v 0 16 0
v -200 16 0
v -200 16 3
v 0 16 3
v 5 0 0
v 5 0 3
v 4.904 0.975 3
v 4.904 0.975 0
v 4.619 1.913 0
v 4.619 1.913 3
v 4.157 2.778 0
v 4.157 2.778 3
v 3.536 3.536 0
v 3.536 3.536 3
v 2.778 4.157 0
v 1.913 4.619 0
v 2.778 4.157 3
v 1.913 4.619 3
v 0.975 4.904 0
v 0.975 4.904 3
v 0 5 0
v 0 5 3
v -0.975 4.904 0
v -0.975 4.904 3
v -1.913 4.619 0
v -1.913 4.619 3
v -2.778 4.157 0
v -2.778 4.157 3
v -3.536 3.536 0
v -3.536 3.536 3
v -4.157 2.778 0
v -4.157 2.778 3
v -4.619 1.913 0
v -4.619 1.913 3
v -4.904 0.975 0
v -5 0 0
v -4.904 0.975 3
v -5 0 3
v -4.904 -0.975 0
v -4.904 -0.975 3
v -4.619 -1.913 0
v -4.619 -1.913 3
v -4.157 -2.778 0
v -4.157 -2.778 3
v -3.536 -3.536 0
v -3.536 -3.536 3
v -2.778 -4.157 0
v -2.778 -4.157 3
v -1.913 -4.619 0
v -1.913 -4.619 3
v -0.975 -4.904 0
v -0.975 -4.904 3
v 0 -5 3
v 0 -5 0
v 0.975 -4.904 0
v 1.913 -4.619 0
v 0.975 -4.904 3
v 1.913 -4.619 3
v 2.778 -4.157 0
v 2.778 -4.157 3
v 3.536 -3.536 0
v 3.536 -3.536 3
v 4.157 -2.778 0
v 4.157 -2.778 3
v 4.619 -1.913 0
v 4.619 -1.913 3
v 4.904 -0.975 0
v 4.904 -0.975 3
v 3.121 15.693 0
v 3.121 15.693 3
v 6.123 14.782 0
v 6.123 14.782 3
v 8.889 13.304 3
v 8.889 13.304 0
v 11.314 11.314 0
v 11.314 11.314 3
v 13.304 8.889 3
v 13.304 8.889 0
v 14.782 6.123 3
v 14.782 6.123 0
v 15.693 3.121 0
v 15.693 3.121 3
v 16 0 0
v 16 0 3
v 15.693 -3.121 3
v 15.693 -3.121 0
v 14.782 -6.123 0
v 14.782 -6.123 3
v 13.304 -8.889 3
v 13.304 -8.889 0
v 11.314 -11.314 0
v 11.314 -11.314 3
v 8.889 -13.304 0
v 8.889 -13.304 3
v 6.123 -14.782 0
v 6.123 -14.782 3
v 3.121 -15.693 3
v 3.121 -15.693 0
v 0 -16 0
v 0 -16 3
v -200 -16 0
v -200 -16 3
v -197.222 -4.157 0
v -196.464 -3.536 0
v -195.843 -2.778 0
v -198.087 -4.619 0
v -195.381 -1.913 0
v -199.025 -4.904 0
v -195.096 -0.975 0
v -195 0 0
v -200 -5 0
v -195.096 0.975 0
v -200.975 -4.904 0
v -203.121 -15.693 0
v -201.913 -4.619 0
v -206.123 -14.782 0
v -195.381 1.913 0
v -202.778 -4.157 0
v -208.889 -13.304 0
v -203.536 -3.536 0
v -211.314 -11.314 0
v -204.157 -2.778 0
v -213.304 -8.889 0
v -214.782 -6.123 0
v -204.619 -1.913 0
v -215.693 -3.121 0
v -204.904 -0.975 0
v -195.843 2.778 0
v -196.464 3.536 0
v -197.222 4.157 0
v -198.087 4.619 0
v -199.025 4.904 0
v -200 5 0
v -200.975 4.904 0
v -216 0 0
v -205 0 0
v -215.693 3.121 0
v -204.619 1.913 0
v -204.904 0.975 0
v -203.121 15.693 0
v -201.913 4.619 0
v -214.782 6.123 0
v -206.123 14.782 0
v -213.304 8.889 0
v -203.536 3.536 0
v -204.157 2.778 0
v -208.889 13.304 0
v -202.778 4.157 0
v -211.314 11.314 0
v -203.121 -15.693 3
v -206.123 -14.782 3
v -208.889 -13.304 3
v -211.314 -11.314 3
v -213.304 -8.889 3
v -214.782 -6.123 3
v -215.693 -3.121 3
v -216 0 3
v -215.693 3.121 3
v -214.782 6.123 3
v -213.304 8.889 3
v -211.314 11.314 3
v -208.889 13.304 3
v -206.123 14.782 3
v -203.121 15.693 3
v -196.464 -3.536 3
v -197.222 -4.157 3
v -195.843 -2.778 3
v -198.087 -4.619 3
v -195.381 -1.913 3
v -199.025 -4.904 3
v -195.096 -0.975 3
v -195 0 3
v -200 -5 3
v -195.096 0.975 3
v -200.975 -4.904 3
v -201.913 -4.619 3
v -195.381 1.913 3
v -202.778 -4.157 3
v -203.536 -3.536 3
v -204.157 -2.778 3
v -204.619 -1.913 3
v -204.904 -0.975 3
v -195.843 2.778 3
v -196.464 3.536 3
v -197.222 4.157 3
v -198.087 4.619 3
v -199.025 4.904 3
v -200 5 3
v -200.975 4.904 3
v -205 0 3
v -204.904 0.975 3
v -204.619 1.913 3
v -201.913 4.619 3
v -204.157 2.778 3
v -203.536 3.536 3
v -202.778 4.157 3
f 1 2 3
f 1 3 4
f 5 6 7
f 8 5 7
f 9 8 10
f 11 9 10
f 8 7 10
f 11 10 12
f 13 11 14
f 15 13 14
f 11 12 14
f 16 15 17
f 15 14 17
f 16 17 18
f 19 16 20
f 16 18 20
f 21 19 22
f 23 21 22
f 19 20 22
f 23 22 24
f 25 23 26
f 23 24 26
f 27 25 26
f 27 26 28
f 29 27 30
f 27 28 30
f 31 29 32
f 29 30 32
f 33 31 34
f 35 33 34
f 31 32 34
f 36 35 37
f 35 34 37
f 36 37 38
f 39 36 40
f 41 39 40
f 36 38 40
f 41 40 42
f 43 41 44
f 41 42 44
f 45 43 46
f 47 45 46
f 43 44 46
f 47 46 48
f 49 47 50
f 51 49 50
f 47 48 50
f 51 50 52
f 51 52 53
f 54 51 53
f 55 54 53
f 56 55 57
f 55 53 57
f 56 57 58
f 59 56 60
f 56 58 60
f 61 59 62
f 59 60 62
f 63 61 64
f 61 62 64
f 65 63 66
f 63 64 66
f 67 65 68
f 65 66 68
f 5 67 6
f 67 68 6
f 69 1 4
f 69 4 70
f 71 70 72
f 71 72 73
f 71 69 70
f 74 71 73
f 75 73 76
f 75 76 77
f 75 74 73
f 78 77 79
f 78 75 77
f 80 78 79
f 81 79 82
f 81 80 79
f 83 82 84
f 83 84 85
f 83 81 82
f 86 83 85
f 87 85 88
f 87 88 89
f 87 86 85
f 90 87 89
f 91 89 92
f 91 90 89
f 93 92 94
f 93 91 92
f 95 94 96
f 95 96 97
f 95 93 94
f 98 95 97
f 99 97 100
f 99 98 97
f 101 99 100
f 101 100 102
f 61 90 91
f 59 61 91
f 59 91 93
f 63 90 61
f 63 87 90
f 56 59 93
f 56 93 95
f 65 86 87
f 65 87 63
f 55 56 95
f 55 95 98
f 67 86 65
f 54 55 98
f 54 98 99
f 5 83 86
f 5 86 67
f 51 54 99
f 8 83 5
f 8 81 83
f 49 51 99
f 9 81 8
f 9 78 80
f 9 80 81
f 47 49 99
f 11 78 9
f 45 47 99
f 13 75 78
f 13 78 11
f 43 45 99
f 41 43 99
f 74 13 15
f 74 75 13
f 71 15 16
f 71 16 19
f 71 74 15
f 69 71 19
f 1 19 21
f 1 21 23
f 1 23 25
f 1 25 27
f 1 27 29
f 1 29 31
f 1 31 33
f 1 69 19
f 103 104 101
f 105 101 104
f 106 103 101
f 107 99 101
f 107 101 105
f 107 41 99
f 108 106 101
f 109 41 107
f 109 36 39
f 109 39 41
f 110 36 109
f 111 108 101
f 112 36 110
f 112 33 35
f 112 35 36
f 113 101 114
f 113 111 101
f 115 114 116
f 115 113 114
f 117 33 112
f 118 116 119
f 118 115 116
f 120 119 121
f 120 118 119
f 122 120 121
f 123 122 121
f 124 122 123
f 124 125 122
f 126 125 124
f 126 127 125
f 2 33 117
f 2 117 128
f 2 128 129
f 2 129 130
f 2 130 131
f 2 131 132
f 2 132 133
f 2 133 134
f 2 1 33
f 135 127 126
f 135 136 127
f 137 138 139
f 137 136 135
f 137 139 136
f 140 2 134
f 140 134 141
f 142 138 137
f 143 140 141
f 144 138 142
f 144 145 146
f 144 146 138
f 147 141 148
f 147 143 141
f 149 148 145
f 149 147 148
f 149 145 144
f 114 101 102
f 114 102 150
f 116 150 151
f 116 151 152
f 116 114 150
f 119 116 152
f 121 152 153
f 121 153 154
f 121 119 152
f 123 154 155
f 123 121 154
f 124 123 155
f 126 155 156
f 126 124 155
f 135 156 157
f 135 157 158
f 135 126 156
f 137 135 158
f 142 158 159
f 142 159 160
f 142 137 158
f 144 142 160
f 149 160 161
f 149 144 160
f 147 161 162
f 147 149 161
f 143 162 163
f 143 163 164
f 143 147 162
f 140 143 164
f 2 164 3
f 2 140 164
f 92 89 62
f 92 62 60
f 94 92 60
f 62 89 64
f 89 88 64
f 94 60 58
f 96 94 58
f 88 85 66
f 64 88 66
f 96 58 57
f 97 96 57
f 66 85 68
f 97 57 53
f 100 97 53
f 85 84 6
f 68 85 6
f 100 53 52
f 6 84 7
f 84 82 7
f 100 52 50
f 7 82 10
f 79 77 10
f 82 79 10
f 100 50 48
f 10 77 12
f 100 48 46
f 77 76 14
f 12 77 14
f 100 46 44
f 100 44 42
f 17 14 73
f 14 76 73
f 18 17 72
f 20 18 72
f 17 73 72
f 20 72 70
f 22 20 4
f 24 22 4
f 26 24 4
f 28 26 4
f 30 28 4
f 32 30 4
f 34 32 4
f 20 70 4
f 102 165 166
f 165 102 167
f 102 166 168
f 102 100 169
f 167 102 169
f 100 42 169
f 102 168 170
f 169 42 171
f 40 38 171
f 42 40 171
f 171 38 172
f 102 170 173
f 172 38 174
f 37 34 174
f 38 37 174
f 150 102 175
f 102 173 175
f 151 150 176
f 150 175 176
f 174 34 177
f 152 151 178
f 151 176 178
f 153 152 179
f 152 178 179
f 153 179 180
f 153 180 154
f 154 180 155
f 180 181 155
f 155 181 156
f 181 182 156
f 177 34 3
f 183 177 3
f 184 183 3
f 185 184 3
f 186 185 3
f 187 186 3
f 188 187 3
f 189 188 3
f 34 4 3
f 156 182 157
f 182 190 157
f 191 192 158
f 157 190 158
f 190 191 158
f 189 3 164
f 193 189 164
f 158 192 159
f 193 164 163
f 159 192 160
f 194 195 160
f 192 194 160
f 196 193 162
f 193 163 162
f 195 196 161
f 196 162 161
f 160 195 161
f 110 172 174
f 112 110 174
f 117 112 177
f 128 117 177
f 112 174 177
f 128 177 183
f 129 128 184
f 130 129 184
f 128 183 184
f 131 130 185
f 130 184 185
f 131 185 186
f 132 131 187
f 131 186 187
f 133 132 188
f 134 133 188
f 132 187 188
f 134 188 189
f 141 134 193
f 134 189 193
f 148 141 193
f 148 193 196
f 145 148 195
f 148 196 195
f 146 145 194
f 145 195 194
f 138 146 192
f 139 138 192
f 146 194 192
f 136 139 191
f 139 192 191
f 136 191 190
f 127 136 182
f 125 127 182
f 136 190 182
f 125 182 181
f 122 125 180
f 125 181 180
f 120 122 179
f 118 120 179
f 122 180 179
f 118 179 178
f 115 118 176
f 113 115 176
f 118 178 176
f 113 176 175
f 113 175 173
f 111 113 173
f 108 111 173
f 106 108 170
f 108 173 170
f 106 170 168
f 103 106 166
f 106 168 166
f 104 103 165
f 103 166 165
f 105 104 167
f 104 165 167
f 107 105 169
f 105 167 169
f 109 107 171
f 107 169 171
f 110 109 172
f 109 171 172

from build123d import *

# Parameters (mm, degrees)
EXTRUDE_1_DEPTH     = 3
SKETCH_2_R          = 5
CUT_EXTRUDE_1_DEPTH = 3


with BuildPart() as part:
    # 草图1 → 凸台-拉伸1 (new body)
    with BuildSketch(Plane.XY):
        with BuildLine():
            Line((0, -16), (-200, -16))
            ThreePointArc((-200, -16), (-216, 0), (-200, 16))
            Line((-200, 16), (0, 16))
            ThreePointArc((0, 16), (16, 0), (0, -16))
        make_face()
    extrude(amount=EXTRUDE_1_DEPTH)

    # 草图2 → 切除-拉伸1 (cut)
    with BuildSketch(Plane.XY.offset(3)):
        with Locations((-200, 0)):
            Circle(SKETCH_2_R)
        Circle(SKETCH_2_R)
    extrude(amount=-CUT_EXTRUDE_1_DEPTH, mode=Mode.SUBTRACT)


solid = part.part
